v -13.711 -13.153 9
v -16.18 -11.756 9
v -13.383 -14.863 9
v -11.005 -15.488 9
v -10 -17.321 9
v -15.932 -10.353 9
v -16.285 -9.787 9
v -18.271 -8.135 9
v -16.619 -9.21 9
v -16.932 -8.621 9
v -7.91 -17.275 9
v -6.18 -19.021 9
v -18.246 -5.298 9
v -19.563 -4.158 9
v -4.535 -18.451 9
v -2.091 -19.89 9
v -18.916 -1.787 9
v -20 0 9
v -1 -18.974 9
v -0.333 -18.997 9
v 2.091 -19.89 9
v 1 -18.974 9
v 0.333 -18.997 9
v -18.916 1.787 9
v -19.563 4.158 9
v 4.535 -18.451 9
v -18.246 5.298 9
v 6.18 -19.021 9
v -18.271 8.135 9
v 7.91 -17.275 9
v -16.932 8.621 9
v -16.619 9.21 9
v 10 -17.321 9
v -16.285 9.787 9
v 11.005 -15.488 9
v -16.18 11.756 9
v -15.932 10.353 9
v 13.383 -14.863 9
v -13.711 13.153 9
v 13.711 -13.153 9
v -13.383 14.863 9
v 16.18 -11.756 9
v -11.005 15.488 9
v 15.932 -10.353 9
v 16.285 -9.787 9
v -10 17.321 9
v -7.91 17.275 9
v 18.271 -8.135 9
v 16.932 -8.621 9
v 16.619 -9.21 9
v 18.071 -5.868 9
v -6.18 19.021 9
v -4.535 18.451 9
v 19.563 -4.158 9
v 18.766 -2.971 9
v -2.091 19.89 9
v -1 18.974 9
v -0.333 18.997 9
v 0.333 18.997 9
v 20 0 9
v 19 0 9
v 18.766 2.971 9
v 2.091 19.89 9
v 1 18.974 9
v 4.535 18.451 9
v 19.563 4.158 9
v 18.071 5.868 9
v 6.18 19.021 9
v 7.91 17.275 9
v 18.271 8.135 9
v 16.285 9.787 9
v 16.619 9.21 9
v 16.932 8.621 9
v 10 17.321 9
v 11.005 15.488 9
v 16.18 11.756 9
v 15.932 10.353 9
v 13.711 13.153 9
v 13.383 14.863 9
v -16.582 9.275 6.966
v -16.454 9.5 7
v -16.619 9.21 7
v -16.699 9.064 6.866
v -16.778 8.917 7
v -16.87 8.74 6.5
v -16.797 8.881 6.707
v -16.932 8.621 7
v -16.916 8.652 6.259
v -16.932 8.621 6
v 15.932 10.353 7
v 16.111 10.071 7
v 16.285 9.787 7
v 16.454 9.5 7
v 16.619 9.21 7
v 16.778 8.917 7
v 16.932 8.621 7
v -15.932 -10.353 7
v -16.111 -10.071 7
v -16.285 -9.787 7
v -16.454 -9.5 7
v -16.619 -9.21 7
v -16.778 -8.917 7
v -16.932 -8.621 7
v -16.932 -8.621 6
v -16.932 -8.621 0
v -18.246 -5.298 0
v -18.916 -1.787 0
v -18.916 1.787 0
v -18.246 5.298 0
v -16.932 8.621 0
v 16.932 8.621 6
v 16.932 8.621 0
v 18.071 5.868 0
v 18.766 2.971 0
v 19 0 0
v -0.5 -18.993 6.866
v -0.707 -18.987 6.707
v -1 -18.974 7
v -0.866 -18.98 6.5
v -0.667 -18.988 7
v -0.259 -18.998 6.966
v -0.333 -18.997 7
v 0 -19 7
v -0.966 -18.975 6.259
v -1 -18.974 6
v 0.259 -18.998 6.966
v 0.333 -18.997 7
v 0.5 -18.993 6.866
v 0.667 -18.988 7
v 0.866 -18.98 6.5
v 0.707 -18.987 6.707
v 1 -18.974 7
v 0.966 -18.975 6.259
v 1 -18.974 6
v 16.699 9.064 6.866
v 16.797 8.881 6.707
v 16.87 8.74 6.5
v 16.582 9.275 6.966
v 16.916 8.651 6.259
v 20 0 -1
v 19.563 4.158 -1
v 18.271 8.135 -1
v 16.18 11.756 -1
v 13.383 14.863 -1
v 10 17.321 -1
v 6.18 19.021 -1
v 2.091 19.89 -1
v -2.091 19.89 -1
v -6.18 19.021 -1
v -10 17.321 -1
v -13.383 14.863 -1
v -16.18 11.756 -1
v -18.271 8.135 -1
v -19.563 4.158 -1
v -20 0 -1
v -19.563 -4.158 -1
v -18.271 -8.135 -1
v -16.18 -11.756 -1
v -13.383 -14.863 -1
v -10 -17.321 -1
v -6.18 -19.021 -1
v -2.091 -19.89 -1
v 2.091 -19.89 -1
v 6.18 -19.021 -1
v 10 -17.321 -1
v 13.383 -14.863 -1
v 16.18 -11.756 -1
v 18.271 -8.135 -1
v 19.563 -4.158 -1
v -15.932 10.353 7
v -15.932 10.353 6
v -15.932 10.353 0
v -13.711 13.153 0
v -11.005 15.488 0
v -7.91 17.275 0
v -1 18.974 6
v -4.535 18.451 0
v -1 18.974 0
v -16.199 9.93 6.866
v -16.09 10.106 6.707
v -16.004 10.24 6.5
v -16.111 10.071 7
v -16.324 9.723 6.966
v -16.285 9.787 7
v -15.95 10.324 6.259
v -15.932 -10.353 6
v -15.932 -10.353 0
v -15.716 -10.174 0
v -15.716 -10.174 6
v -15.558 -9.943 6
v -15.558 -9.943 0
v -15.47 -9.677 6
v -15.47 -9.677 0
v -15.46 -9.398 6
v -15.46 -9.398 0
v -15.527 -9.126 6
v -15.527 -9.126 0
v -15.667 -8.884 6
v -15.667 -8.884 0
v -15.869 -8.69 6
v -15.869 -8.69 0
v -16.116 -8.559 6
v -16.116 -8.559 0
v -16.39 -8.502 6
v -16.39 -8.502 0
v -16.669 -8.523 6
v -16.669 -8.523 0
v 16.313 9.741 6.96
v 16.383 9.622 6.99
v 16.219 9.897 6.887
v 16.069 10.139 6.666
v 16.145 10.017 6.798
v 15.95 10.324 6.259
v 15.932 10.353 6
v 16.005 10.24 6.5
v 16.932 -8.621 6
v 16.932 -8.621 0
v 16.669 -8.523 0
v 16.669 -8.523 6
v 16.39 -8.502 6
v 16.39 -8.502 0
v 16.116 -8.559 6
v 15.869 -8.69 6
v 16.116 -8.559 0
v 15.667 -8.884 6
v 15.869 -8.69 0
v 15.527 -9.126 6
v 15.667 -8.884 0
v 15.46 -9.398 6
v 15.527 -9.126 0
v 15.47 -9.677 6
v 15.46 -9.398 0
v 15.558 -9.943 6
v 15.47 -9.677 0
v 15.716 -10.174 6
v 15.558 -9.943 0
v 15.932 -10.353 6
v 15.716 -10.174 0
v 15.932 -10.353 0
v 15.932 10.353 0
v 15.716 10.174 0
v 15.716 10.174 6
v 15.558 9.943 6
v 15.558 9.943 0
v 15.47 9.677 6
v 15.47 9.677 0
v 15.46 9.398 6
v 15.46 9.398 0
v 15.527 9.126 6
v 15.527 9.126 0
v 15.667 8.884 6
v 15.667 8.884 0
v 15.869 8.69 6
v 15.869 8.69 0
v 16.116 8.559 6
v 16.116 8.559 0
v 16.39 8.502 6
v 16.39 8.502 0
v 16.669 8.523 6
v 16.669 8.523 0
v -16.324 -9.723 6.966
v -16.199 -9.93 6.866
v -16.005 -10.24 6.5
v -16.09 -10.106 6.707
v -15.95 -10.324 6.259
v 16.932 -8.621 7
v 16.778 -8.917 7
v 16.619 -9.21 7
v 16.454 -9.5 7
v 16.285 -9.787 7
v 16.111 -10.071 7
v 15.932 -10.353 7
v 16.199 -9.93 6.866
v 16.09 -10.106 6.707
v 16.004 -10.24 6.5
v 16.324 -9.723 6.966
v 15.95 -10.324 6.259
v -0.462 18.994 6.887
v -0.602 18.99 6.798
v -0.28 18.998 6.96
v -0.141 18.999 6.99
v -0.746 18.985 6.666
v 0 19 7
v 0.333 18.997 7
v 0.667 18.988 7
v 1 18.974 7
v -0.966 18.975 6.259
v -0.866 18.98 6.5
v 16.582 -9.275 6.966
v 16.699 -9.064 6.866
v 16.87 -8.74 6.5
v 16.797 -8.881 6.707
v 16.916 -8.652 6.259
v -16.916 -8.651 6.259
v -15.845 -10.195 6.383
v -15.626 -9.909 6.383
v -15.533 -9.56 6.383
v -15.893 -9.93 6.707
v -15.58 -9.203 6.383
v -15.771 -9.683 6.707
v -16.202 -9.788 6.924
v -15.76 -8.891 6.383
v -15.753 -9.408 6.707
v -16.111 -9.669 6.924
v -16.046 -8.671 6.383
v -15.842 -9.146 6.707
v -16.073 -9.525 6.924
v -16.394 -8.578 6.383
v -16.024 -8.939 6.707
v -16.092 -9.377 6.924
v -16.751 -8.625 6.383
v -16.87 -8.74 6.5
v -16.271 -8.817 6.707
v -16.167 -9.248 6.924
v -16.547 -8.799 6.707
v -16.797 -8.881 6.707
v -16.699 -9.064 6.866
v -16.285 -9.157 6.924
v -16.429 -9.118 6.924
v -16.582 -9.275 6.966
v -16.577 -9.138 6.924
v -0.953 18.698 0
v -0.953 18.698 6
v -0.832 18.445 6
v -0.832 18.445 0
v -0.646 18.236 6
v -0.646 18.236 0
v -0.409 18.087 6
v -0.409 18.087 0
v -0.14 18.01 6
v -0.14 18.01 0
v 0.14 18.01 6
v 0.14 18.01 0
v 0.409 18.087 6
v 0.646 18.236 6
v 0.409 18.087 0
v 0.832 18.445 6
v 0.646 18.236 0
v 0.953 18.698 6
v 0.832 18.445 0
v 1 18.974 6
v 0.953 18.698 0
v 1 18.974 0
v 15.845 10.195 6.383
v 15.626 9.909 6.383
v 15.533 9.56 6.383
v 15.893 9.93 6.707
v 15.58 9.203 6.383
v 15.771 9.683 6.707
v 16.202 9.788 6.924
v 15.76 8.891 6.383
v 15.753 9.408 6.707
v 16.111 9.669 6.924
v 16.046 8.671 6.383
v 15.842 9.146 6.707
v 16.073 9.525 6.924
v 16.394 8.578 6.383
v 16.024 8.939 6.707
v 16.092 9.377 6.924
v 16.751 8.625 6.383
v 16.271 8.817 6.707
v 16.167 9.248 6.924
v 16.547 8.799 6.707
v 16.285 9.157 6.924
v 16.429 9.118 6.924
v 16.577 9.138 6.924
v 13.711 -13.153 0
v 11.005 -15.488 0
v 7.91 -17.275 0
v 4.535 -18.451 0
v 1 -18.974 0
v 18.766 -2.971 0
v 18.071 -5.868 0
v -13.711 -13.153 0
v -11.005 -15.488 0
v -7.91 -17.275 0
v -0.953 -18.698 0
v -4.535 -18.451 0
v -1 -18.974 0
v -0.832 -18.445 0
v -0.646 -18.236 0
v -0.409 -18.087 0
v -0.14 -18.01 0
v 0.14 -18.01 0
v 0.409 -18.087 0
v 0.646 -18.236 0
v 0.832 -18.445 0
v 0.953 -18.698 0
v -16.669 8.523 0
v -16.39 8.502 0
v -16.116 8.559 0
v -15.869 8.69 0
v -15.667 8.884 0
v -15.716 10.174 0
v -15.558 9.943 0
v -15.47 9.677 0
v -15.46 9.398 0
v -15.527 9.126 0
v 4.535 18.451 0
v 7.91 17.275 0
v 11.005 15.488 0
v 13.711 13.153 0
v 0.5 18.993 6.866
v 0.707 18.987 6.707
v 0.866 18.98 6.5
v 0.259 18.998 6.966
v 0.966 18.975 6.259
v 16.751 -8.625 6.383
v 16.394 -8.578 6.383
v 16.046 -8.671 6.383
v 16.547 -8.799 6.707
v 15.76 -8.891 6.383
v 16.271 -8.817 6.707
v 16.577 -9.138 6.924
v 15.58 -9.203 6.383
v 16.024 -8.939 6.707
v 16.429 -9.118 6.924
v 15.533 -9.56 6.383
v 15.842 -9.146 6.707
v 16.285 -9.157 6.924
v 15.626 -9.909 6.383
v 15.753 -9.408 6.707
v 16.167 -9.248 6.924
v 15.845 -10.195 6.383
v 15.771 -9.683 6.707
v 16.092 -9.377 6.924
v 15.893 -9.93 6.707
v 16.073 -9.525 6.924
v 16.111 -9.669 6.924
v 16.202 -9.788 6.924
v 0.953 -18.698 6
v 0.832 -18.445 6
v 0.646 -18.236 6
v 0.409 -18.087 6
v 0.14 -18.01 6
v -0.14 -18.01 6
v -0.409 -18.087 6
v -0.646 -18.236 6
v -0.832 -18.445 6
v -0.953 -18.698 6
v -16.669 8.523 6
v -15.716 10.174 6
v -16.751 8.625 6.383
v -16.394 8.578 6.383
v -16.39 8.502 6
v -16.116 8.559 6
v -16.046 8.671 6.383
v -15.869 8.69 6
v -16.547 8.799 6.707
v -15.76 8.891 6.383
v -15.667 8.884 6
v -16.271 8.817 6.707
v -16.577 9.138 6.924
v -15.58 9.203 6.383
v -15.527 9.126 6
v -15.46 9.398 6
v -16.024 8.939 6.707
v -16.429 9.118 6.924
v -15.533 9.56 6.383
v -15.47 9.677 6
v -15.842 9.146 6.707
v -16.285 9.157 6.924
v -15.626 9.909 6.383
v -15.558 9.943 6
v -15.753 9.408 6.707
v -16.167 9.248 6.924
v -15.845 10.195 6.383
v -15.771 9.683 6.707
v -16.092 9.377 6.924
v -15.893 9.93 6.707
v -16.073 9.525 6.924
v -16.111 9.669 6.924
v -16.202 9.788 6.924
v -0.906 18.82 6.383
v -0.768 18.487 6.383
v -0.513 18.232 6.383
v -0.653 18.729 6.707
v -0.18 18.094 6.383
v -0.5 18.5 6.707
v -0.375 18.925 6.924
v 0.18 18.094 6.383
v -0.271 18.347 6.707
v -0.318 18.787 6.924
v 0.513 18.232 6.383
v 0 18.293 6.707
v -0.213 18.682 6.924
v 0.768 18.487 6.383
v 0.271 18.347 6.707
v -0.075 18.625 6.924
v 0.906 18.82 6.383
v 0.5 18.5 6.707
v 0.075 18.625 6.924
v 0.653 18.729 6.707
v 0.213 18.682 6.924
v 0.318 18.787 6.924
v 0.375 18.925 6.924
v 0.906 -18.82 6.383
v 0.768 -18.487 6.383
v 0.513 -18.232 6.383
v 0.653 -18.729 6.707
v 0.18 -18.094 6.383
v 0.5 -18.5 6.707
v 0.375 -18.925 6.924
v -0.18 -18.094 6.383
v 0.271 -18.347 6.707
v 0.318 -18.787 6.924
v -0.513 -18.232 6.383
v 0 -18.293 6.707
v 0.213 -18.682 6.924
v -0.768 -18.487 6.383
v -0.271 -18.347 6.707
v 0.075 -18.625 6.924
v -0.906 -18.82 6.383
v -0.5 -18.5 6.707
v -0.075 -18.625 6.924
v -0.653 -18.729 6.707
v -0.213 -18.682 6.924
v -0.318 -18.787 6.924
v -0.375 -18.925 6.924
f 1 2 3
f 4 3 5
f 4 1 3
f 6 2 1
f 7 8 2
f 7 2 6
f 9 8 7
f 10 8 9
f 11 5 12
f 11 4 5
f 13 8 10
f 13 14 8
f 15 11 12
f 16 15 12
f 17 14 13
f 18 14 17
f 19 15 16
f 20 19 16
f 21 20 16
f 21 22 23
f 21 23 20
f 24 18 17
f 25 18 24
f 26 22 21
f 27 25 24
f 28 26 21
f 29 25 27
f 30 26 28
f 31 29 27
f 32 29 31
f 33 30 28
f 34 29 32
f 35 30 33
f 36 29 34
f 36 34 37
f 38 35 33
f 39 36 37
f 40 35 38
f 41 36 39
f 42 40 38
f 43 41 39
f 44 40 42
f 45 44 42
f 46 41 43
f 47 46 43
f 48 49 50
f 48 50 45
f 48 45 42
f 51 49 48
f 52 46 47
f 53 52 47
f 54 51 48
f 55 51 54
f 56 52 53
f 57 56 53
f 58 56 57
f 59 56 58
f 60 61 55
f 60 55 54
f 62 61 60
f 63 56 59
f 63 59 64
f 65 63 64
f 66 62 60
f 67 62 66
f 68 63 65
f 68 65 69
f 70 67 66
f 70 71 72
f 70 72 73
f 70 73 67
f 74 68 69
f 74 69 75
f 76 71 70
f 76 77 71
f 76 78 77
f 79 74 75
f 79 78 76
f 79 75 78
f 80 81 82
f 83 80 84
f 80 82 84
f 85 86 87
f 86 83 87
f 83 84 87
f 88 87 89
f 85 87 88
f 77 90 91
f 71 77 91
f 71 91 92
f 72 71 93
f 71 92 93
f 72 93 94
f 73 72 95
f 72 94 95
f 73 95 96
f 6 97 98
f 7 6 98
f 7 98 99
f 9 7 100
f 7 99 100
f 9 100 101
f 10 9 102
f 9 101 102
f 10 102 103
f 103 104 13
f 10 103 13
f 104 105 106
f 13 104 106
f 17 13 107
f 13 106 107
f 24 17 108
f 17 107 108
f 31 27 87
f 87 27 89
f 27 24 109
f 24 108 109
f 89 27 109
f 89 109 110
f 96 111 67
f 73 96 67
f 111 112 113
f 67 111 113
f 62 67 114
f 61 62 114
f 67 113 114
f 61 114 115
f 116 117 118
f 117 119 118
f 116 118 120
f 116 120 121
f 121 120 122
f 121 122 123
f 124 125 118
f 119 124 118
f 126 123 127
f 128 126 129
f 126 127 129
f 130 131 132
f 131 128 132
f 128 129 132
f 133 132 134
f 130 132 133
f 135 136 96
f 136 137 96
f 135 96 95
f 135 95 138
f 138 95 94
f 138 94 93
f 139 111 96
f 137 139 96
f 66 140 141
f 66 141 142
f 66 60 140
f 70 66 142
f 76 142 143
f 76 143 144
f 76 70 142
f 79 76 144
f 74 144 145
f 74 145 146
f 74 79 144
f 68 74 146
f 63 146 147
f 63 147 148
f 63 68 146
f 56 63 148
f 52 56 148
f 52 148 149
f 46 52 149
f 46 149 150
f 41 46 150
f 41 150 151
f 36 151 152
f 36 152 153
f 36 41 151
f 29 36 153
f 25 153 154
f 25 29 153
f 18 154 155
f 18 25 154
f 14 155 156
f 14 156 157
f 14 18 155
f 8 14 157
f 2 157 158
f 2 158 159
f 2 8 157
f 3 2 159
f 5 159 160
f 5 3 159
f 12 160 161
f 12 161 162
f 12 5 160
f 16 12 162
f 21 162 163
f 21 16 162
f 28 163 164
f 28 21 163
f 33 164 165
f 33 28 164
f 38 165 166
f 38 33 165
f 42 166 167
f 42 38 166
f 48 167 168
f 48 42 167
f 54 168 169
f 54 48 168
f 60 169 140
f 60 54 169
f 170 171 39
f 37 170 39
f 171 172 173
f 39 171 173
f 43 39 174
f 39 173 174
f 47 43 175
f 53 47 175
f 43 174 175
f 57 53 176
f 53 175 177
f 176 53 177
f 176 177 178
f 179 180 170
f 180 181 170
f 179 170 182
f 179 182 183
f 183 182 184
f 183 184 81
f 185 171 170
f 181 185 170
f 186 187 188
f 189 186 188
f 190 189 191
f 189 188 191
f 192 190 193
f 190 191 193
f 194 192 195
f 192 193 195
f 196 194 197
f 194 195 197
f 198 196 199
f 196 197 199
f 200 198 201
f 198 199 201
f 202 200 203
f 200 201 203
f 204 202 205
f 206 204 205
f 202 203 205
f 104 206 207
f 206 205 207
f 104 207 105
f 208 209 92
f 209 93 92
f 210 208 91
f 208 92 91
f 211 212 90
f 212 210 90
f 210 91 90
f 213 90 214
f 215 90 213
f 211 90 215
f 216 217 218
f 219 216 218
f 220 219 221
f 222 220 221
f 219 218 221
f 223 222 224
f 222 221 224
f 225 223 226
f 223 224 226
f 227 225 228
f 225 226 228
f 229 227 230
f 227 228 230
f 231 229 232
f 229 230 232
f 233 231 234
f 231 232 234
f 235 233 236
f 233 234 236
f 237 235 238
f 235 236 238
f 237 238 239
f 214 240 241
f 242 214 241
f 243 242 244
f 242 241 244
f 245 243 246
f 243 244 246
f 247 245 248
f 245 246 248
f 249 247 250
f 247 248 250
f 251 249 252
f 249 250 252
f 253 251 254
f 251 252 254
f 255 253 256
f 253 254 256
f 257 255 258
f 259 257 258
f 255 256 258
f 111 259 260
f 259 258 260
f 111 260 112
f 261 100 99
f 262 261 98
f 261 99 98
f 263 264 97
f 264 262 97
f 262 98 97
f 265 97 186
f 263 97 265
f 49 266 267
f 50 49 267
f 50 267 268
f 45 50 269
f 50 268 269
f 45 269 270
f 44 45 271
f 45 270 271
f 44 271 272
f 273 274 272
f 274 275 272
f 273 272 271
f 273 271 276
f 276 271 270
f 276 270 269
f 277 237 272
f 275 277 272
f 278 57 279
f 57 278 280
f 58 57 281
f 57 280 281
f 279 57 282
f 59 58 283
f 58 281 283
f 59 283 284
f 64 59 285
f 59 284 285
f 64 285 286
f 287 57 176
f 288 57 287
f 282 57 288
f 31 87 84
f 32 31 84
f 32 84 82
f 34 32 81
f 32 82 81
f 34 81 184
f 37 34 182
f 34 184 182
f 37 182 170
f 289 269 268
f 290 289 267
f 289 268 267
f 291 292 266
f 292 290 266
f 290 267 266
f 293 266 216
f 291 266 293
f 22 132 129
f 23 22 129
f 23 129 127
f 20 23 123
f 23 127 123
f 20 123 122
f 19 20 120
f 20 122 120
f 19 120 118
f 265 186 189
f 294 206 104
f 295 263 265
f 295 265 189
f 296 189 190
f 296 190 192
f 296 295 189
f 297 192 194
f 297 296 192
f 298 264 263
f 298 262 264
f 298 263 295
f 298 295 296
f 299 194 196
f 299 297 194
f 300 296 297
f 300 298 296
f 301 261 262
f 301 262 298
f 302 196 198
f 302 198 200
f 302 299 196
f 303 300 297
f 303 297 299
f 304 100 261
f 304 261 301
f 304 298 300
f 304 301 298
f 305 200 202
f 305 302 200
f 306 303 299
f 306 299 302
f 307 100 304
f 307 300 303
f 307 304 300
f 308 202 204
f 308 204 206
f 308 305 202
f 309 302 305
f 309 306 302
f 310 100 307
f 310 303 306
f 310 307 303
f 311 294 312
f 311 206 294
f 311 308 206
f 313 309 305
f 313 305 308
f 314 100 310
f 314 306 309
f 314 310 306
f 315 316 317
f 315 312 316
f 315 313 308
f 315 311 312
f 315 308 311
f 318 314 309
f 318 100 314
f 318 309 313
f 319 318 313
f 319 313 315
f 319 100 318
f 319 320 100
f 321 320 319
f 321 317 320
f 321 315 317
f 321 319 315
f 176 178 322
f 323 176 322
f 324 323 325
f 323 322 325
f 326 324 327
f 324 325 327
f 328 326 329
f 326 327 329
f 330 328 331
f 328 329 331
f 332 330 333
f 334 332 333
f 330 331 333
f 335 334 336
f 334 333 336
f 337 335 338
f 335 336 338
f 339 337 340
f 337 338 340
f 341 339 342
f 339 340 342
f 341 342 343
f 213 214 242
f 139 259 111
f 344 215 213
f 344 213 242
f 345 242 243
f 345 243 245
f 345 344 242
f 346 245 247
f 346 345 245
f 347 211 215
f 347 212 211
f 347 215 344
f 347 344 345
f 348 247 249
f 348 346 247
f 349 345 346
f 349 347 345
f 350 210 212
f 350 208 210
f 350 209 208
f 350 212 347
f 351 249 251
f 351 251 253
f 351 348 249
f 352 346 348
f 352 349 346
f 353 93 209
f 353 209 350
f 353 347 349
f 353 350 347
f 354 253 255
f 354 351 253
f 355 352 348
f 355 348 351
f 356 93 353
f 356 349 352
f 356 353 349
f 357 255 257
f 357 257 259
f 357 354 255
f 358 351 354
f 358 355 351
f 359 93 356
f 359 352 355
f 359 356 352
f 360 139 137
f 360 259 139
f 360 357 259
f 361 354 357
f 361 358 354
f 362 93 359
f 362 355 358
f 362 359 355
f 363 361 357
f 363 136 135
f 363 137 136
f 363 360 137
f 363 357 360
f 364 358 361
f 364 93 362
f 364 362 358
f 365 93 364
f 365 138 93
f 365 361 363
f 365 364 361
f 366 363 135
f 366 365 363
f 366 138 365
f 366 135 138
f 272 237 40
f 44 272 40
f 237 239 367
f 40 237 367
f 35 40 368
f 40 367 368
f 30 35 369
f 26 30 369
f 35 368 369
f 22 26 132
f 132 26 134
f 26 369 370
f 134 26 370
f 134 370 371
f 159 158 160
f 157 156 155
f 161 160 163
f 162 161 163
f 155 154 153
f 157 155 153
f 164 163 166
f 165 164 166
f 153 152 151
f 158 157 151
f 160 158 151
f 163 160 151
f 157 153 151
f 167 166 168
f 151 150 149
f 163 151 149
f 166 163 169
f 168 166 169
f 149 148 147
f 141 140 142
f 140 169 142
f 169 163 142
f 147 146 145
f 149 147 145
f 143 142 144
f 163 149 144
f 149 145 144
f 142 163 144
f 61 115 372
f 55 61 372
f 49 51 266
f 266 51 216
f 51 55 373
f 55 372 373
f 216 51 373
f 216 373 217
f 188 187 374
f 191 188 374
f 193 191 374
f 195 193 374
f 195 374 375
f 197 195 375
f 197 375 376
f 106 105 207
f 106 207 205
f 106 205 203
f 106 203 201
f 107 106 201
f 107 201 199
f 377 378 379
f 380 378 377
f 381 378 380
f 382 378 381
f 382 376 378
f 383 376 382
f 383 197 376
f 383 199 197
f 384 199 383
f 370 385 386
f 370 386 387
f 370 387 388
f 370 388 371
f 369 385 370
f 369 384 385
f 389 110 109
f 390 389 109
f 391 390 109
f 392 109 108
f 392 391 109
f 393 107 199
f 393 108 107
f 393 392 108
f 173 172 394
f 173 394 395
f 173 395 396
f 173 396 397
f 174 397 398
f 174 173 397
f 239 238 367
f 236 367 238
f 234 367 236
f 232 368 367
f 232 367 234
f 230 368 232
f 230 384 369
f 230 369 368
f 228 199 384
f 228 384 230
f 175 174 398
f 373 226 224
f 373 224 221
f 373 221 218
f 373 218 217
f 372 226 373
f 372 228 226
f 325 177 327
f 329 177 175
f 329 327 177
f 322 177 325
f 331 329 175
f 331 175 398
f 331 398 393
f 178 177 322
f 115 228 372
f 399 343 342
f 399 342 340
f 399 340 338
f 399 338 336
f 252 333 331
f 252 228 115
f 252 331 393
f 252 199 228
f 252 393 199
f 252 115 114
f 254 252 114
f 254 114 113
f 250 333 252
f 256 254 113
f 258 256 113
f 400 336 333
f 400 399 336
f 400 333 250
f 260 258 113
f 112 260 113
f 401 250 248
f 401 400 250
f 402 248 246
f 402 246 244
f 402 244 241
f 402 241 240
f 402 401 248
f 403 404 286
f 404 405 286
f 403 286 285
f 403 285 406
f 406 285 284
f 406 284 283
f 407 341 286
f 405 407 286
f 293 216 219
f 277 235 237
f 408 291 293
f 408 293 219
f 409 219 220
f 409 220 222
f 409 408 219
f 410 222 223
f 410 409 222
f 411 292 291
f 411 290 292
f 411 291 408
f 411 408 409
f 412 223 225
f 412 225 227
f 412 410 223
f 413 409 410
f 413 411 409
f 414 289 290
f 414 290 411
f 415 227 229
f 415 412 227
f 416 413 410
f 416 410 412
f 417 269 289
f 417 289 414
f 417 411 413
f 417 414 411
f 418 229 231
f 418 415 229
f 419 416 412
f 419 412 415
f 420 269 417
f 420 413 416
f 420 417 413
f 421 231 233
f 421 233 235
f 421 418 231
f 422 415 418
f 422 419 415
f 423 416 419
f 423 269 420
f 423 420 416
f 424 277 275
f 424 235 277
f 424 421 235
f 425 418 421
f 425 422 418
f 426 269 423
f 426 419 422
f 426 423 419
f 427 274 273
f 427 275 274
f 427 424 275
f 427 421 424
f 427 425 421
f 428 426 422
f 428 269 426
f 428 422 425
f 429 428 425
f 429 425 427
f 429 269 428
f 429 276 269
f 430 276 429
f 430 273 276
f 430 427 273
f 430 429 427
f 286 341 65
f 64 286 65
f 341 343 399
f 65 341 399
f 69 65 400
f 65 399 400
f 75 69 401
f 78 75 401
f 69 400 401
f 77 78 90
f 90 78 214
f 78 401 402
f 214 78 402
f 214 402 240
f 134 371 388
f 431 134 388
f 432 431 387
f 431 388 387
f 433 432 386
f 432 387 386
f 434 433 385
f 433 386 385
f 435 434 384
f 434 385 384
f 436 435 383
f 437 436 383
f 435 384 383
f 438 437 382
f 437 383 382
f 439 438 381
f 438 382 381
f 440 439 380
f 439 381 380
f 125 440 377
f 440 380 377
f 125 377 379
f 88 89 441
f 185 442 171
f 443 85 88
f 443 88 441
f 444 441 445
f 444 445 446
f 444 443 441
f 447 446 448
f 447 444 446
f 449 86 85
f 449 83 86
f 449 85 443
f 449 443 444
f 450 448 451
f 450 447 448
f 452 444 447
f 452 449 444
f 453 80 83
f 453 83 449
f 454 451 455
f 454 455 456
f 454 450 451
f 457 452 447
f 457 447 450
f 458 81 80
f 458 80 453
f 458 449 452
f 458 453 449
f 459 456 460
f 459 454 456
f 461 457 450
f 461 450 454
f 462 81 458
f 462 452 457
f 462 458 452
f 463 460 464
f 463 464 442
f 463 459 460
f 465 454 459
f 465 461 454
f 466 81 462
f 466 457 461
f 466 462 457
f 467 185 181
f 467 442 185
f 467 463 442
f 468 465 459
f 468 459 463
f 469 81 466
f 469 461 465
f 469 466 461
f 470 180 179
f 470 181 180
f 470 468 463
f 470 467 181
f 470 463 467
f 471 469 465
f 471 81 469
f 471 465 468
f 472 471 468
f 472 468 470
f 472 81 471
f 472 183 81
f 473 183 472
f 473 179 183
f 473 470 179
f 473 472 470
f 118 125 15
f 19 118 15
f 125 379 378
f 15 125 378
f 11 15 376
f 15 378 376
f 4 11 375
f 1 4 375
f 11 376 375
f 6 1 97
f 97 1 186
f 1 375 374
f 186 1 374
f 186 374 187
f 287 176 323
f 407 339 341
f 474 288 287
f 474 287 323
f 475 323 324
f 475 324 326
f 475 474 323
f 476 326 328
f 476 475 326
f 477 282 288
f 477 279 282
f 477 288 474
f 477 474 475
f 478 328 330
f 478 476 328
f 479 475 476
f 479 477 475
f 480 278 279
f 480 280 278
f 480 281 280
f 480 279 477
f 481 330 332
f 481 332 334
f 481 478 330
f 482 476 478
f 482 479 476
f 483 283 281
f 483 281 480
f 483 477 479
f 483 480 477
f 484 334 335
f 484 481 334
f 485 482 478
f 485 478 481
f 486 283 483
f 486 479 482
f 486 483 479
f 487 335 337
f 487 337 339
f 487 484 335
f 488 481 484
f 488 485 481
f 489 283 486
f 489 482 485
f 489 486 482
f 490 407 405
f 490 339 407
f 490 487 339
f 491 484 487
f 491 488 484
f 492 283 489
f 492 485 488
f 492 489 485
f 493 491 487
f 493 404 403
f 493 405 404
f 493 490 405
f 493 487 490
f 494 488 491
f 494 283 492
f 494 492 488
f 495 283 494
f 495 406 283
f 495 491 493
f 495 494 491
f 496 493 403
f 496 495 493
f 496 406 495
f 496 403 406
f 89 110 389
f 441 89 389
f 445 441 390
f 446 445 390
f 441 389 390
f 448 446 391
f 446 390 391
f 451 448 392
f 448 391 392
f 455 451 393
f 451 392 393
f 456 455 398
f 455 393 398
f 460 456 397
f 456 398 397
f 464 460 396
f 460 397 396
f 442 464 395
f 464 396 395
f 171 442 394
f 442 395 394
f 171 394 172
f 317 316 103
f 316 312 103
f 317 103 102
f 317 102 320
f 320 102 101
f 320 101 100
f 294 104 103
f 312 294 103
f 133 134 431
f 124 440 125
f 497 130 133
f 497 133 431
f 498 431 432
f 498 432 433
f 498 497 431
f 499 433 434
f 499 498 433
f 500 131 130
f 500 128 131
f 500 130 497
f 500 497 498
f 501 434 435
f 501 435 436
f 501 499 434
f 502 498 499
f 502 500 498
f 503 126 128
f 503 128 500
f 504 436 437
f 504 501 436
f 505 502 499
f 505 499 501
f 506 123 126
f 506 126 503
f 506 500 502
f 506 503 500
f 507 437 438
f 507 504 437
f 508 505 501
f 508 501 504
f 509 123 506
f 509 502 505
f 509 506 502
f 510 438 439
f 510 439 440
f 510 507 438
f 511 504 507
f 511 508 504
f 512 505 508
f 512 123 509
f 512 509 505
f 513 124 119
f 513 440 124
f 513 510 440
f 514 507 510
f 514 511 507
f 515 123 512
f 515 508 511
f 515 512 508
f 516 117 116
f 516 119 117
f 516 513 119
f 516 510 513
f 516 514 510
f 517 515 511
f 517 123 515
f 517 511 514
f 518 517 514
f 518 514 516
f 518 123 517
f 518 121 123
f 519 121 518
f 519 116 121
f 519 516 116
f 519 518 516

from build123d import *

# Parameters (mm, degrees)
F0_R          = 20
F1_DEPTH      = 9
F2_DEPTH      = 1
F3_DEPTH      = 7
F3_DEPTH_BACK = 1
F4_T4_ANGLE   = 359.64
F4_S5_R       = 19
F4_T6_DEPTH   = 3
F4_T10_ANGLE  = 359.64
F4_S11_R      = 19
F4_T12_DEPTH  = 3
F4_T16_ANGLE  = 359.64
F4_S17_R      = 19
F4_T18_DEPTH  = 3
F4_T22_ANGLE  = 359.64
F4_S23_R      = 19
F4_T24_DEPTH  = 3
F4_T28_ANGLE  = 359.64
F4_S29_R      = 19
F4_T30_DEPTH  = 3
F4_T34_ANGLE  = 359.64
F4_S35_R      = 19
F4_T36_DEPTH  = 3


# Not quite as in the source:
# - a fillet or chamfer that OpenCascade refuses, or shapes differently, is made with other operations: its cross-section is extruded or revolved along the edge and cut away or added


with BuildPart() as f1:
    # F0 (on Top) → F1 (new body)
    with BuildSketch(Plane.XY):
        Circle(F0_R)
        with BuildLine():
            ThreePointArc((16.9315193695, 8.6211166237), (18.4756443463, 4.432895892), (19, 0))
            ThreePointArc((19, 0), (18.4756443463, -4.432895892), (16.9315193695, -8.6211166237))
            ThreePointArc((16.9315193695, -8.6211166237), (16.4544826719, -9.5), (15.9318656899, -10.3525675868))
            ThreePointArc((15.9318656899, -10.3525675868), (9.5, -16.4544826719), (0.9996536796, -18.9736842105))
            ThreePointArc((0.9996536796, -18.9736842105), (0, -19), (-0.9996536796, -18.9736842105))
            ThreePointArc((-0.9996536796, -18.9736842105), (-9.5, -16.4544826719), (-15.9318656899, -10.3525675868))
            ThreePointArc((-15.9318656899, -10.3525675868), (-16.4544826719, -9.5), (-16.9315193695, -8.6211166237))
            ThreePointArc((-16.9315193695, -8.6211166237), (-19, 0), (-16.9315193695, 8.6211166237))
            ThreePointArc((-16.9315193695, 8.6211166237), (-16.4544826719, 9.5), (-15.9318656899, 10.3525675868))
            ThreePointArc((-15.9318656899, 10.3525675868), (-9.5, 16.4544826719), (-0.9996536796, 18.9736842105))
            ThreePointArc((-0.9996536796, 18.9736842105), (0, 19), (0.9996536796, 18.9736842105))
            ThreePointArc((0.9996536796, 18.9736842105), (9.5, 16.4544826719), (15.9318656899, 10.3525675868))
            ThreePointArc((15.9318656899, 10.3525675868), (16.4544826719, 9.5), (16.9315193695, 8.6211166237))
        make_face(mode=Mode.SUBTRACT)
    extrude(amount=F1_DEPTH)

    # F0 (on Top) → F2 (join)
    with BuildSketch(Plane.XY):
        Circle(F0_R)
        with BuildLine():
            ThreePointArc((16.9315193695, 8.6211166237), (18.4756443463, 4.432895892), (19, 0))
            ThreePointArc((19, 0), (18.4756443463, -4.432895892), (16.9315193695, -8.6211166237))
            ThreePointArc((16.9315193695, -8.6211166237), (16.4544826719, -9.5), (15.9318656899, -10.3525675868))
            ThreePointArc((15.9318656899, -10.3525675868), (9.5, -16.4544826719), (0.9996536796, -18.9736842105))
            ThreePointArc((0.9996536796, -18.9736842105), (0, -19), (-0.9996536796, -18.9736842105))
            ThreePointArc((-0.9996536796, -18.9736842105), (-9.5, -16.4544826719), (-15.9318656899, -10.3525675868))
            ThreePointArc((-15.9318656899, -10.3525675868), (-16.4544826719, -9.5), (-16.9315193695, -8.6211166237))
            ThreePointArc((-16.9315193695, -8.6211166237), (-19, 0), (-16.9315193695, 8.6211166237))
            ThreePointArc((-16.9315193695, 8.6211166237), (-16.4544826719, 9.5), (-15.9318656899, 10.3525675868))
            ThreePointArc((-15.9318656899, 10.3525675868), (-9.5, 16.4544826719), (-0.9996536796, 18.9736842105))
            ThreePointArc((-0.9996536796, 18.9736842105), (0, 19), (0.9996536796, 18.9736842105))
            ThreePointArc((0.9996536796, 18.9736842105), (9.5, 16.4544826719), (15.9318656899, 10.3525675868))
            ThreePointArc((15.9318656899, 10.3525675868), (16.4544826719, 9.5), (16.9315193695, 8.6211166237))
        make_face(mode=Mode.SUBTRACT)
        with BuildLine():
            ThreePointArc((16.9315193695, -8.6211166237), (18.4756443463, -4.432895892), (19, 0))
            ThreePointArc((19, 0), (18.4756443463, 4.432895892), (16.9315193695, 8.6211166237))
            ThreePointArc((16.9315193695, 8.6211166237), (15.5884572681, 9), (15.9318656899, 10.3525675868))
            ThreePointArc((15.9318656899, 10.3525675868), (9.5, 16.4544826719), (0.9996536796, 18.9736842105))
            ThreePointArc((0.9996536796, 18.9736842105), (0, 18), (-0.9996536796, 18.9736842105))
            ThreePointArc((-0.9996536796, 18.9736842105), (-9.5, 16.4544826719), (-15.9318656899, 10.3525675868))
            ThreePointArc((-15.9318656899, 10.3525675868), (-15.5884572681, 9), (-16.9315193695, 8.6211166237))
            ThreePointArc((-16.9315193695, 8.6211166237), (-19, 0), (-16.9315193695, -8.6211166237))
            ThreePointArc((-16.9315193695, -8.6211166237), (-15.5884572681, -9), (-15.9318656899, -10.3525675868))
            ThreePointArc((-15.9318656899, -10.3525675868), (-9.5, -16.4544826719), (-0.9996536796, -18.9736842105))
            ThreePointArc((-0.9996536796, -18.9736842105), (0, -18), (0.9996536796, -18.9736842105))
            ThreePointArc((0.9996536796, -18.9736842105), (9.5, -16.4544826719), (15.9318656899, -10.3525675868))
            ThreePointArc((15.9318656899, -10.3525675868), (15.5884572681, -9), (16.9315193695, -8.6211166237))
        make_face()
    extrude(amount=-F2_DEPTH)

    # F0 (on Top) → F3 (join, two sides)
    with BuildSketch(Plane.XY) as f3_sk:
        with BuildLine():
            ThreePointArc((-16.9315193695, 8.6211166237), (-15.5884572681, 9), (-15.9318656899, 10.3525675868))
            ThreePointArc((-15.9318656899, 10.3525675868), (-16.4544826719, 9.5), (-16.9315193695, 8.6211166237))
        make_face()
        with BuildLine():
            ThreePointArc((-0.9996536796, 18.9736842105), (0, 18), (0.9996536796, 18.9736842105))
            ThreePointArc((0.9996536796, 18.9736842105), (0, 19), (-0.9996536796, 18.9736842105))
        make_face()
        with BuildLine():
            ThreePointArc((15.9318656899, 10.3525675868), (15.5884572681, 9), (16.9315193695, 8.6211166237))
            ThreePointArc((16.9315193695, 8.6211166237), (16.4544826719, 9.5), (15.9318656899, 10.3525675868))
        make_face()
        with BuildLine():
            ThreePointArc((15.9318656899, -10.3525675868), (16.4544826719, -9.5), (16.9315193695, -8.6211166237))
            ThreePointArc((16.9315193695, -8.6211166237), (15.5884572681, -9), (15.9318656899, -10.3525675868))
        make_face()
        with BuildLine():
            ThreePointArc((-0.9996536796, -18.9736842105), (0, -19), (0.9996536796, -18.9736842105))
            ThreePointArc((0.9996536796, -18.9736842105), (0, -18), (-0.9996536796, -18.9736842105))
        make_face()
        with BuildLine():
            ThreePointArc((-16.9315193695, -8.6211166237), (-16.4544826719, -9.5), (-15.9318656899, -10.3525675868))
            ThreePointArc((-15.9318656899, -10.3525675868), (-15.5884572681, -9), (-16.9315193695, -8.6211166237))
        make_face()
    extrude(amount=F3_DEPTH)
    extrude(f3_sk.sketch, amount=-F3_DEPTH_BACK)

    # F4: fillet of radius 1 on 6 edges, made by hand


with BuildPart() as f4_tool2:
    # F4_s3 → F4_t4 (revolve)
    with BuildSketch(Plane(origin=(0.0300073325, -0.0515991808, 0), x_dir=(0, 0, 1), z_dir=(0.5027182272, -0.8644503364, 0))):
        with BuildLine():
            ThreePointArc((6, -19.9999062388), (6.7071067812, -19.70701302), (7, -18.9999062388))
            Line((7, -18.9999062388), (7, -19.9999062388))
            Line((7, -19.9999062388), (6, -19.9999062388))
        make_face()
    revolve(axis=Axis((16.4544826719, 9.5, 7), (0, 0, 1)), revolution_arc=F4_T4_ANGLE)

    # F4_s5 → F4_t6 (intersect, symmetric)
    with BuildSketch(Plane.XY.offset(6.5)):
        Circle(F4_S5_R)
    extrude(amount=F4_T6_DEPTH, both=True, mode=Mode.INTERSECT)


with BuildPart() as f1_1:
    add(f1.part)

    # F4_t1: cut F4_tool2
    add(f4_tool2.part, mode=Mode.SUBTRACT)


with BuildPart() as f4_tool8:
    # F4_s9 → F4_t10 (revolve)
    with BuildSketch(Plane(origin=(-0.0296825351, -0.0517867027, 0), x_dir=(0, 0, 1), z_dir=(-0.497276838, -0.8675919239, 0))):
        with BuildLine():
            ThreePointArc((6, -19.9999062388), (6.7071067812, -19.70701302), (7, -18.9999062388))
            Line((7, -18.9999062388), (7, -19.9999062388))
            Line((7, -19.9999062388), (6, -19.9999062388))
        make_face()
    revolve(axis=Axis((16.4544826719, -9.5, 7), (0, 0, 1)), revolution_arc=F4_T10_ANGLE)

    # F4_s11 → F4_t12 (intersect, symmetric)
    with BuildSketch(Plane.XY.offset(6.5)):
        Circle(F4_S11_R)
    extrude(amount=F4_T12_DEPTH, both=True, mode=Mode.INTERSECT)


with BuildPart() as f1_2:
    add(f1_1.part)

    # F4_t7: cut F4_tool8
    add(f4_tool8.part, mode=Mode.SUBTRACT)


with BuildPart() as f4_tool14:
    # F4_s15 → F4_t16 (revolve)
    with BuildSketch(Plane(origin=(-0.0596898677, -0.0001875219, 0), x_dir=(0, 0, 1), z_dir=(-0.9999950652, -0.0031415875, 0))):
        with BuildLine():
            ThreePointArc((6, -19.9999062388), (6.7071067812, -19.70701302), (7, -18.9999062388))
            Line((7, -18.9999062388), (7, -19.9999062388))
            Line((7, -19.9999062388), (6, -19.9999062388))
        make_face()
    revolve(axis=Axis((0, -19, 7), (0, 0, 1)), revolution_arc=F4_T16_ANGLE)

    # F4_s17 → F4_t18 (intersect, symmetric)
    with BuildSketch(Plane.XY.offset(6.5)):
        Circle(F4_S17_R)
    extrude(amount=F4_T18_DEPTH, both=True, mode=Mode.INTERSECT)


with BuildPart() as f1_3:
    add(f1_2.part)

    # F4_t13: cut F4_tool14
    add(f4_tool14.part, mode=Mode.SUBTRACT)


with BuildPart() as f4_tool20:
    # F4_s21 → F4_t22 (revolve)
    with BuildSketch(Plane(origin=(-0.0300073325, 0.0515991808, 0), x_dir=(0, 0, 1), z_dir=(-0.5027182272, 0.8644503364, 0))):
        with BuildLine():
            ThreePointArc((6, -19.9999062388), (6.7071067812, -19.70701302), (7, -18.9999062388))
            Line((7, -18.9999062388), (7, -19.9999062388))
            Line((7, -19.9999062388), (6, -19.9999062388))
        make_face()
    revolve(axis=Axis((-16.4544826719, -9.5, 7), (0, 0, 1)), revolution_arc=F4_T22_ANGLE)

    # F4_s23 → F4_t24 (intersect, symmetric)
    with BuildSketch(Plane.XY.offset(6.5)):
        Circle(F4_S23_R)
    extrude(amount=F4_T24_DEPTH, both=True, mode=Mode.INTERSECT)


with BuildPart() as f1_4:
    add(f1_3.part)

    # F4_t19: cut F4_tool20
    add(f4_tool20.part, mode=Mode.SUBTRACT)


with BuildPart() as f4_tool26:
    # F4_s27 → F4_t28 (revolve)
    with BuildSketch(Plane(origin=(0.0296825351, 0.0517867027, 0), x_dir=(0, 0, 1), z_dir=(0.497276838, 0.8675919239, 0))):
        with BuildLine():
            ThreePointArc((6, -19.9999062388), (6.7071067812, -19.70701302), (7, -18.9999062388))
            Line((7, -18.9999062388), (7, -19.9999062388))
            Line((7, -19.9999062388), (6, -19.9999062388))
        make_face()
    revolve(axis=Axis((-16.4544826719, 9.5, 7), (0, 0, 1)), revolution_arc=F4_T28_ANGLE)

    # F4_s29 → F4_t30 (intersect, symmetric)
    with BuildSketch(Plane.XY.offset(6.5)):
        Circle(F4_S29_R)
    extrude(amount=F4_T30_DEPTH, both=True, mode=Mode.INTERSECT)


with BuildPart() as f1_5:
    add(f1_4.part)

    # F4_t25: cut F4_tool26
    add(f4_tool26.part, mode=Mode.SUBTRACT)


with BuildPart() as f4_tool32:
    # F4_s33 → F4_t34 (revolve)
    with BuildSketch(Plane(origin=(0.0596898677, 0.0001875219, 0), x_dir=(0, 0, 1), z_dir=(0.9999950652, 0.0031415875, 0))):
        with BuildLine():
            ThreePointArc((6, -19.9999062388), (6.7071067812, -19.70701302), (7, -18.9999062388))
            Line((7, -18.9999062388), (7, -19.9999062388))
            Line((7, -19.9999062388), (6, -19.9999062388))
        make_face()
    revolve(axis=Axis((0, 19, 7), (0, 0, 1)), revolution_arc=F4_T34_ANGLE)

    # F4_s35 → F4_t36 (intersect, symmetric)
    with BuildSketch(Plane.XY.offset(6.5)):
        Circle(F4_S35_R)
    extrude(amount=F4_T36_DEPTH, both=True, mode=Mode.INTERSECT)


with BuildPart() as f1_6:
    add(f1_5.part)

    # F4_t31: cut F4_tool32
    add(f4_tool32.part, mode=Mode.SUBTRACT)


solid = f1_6.part
